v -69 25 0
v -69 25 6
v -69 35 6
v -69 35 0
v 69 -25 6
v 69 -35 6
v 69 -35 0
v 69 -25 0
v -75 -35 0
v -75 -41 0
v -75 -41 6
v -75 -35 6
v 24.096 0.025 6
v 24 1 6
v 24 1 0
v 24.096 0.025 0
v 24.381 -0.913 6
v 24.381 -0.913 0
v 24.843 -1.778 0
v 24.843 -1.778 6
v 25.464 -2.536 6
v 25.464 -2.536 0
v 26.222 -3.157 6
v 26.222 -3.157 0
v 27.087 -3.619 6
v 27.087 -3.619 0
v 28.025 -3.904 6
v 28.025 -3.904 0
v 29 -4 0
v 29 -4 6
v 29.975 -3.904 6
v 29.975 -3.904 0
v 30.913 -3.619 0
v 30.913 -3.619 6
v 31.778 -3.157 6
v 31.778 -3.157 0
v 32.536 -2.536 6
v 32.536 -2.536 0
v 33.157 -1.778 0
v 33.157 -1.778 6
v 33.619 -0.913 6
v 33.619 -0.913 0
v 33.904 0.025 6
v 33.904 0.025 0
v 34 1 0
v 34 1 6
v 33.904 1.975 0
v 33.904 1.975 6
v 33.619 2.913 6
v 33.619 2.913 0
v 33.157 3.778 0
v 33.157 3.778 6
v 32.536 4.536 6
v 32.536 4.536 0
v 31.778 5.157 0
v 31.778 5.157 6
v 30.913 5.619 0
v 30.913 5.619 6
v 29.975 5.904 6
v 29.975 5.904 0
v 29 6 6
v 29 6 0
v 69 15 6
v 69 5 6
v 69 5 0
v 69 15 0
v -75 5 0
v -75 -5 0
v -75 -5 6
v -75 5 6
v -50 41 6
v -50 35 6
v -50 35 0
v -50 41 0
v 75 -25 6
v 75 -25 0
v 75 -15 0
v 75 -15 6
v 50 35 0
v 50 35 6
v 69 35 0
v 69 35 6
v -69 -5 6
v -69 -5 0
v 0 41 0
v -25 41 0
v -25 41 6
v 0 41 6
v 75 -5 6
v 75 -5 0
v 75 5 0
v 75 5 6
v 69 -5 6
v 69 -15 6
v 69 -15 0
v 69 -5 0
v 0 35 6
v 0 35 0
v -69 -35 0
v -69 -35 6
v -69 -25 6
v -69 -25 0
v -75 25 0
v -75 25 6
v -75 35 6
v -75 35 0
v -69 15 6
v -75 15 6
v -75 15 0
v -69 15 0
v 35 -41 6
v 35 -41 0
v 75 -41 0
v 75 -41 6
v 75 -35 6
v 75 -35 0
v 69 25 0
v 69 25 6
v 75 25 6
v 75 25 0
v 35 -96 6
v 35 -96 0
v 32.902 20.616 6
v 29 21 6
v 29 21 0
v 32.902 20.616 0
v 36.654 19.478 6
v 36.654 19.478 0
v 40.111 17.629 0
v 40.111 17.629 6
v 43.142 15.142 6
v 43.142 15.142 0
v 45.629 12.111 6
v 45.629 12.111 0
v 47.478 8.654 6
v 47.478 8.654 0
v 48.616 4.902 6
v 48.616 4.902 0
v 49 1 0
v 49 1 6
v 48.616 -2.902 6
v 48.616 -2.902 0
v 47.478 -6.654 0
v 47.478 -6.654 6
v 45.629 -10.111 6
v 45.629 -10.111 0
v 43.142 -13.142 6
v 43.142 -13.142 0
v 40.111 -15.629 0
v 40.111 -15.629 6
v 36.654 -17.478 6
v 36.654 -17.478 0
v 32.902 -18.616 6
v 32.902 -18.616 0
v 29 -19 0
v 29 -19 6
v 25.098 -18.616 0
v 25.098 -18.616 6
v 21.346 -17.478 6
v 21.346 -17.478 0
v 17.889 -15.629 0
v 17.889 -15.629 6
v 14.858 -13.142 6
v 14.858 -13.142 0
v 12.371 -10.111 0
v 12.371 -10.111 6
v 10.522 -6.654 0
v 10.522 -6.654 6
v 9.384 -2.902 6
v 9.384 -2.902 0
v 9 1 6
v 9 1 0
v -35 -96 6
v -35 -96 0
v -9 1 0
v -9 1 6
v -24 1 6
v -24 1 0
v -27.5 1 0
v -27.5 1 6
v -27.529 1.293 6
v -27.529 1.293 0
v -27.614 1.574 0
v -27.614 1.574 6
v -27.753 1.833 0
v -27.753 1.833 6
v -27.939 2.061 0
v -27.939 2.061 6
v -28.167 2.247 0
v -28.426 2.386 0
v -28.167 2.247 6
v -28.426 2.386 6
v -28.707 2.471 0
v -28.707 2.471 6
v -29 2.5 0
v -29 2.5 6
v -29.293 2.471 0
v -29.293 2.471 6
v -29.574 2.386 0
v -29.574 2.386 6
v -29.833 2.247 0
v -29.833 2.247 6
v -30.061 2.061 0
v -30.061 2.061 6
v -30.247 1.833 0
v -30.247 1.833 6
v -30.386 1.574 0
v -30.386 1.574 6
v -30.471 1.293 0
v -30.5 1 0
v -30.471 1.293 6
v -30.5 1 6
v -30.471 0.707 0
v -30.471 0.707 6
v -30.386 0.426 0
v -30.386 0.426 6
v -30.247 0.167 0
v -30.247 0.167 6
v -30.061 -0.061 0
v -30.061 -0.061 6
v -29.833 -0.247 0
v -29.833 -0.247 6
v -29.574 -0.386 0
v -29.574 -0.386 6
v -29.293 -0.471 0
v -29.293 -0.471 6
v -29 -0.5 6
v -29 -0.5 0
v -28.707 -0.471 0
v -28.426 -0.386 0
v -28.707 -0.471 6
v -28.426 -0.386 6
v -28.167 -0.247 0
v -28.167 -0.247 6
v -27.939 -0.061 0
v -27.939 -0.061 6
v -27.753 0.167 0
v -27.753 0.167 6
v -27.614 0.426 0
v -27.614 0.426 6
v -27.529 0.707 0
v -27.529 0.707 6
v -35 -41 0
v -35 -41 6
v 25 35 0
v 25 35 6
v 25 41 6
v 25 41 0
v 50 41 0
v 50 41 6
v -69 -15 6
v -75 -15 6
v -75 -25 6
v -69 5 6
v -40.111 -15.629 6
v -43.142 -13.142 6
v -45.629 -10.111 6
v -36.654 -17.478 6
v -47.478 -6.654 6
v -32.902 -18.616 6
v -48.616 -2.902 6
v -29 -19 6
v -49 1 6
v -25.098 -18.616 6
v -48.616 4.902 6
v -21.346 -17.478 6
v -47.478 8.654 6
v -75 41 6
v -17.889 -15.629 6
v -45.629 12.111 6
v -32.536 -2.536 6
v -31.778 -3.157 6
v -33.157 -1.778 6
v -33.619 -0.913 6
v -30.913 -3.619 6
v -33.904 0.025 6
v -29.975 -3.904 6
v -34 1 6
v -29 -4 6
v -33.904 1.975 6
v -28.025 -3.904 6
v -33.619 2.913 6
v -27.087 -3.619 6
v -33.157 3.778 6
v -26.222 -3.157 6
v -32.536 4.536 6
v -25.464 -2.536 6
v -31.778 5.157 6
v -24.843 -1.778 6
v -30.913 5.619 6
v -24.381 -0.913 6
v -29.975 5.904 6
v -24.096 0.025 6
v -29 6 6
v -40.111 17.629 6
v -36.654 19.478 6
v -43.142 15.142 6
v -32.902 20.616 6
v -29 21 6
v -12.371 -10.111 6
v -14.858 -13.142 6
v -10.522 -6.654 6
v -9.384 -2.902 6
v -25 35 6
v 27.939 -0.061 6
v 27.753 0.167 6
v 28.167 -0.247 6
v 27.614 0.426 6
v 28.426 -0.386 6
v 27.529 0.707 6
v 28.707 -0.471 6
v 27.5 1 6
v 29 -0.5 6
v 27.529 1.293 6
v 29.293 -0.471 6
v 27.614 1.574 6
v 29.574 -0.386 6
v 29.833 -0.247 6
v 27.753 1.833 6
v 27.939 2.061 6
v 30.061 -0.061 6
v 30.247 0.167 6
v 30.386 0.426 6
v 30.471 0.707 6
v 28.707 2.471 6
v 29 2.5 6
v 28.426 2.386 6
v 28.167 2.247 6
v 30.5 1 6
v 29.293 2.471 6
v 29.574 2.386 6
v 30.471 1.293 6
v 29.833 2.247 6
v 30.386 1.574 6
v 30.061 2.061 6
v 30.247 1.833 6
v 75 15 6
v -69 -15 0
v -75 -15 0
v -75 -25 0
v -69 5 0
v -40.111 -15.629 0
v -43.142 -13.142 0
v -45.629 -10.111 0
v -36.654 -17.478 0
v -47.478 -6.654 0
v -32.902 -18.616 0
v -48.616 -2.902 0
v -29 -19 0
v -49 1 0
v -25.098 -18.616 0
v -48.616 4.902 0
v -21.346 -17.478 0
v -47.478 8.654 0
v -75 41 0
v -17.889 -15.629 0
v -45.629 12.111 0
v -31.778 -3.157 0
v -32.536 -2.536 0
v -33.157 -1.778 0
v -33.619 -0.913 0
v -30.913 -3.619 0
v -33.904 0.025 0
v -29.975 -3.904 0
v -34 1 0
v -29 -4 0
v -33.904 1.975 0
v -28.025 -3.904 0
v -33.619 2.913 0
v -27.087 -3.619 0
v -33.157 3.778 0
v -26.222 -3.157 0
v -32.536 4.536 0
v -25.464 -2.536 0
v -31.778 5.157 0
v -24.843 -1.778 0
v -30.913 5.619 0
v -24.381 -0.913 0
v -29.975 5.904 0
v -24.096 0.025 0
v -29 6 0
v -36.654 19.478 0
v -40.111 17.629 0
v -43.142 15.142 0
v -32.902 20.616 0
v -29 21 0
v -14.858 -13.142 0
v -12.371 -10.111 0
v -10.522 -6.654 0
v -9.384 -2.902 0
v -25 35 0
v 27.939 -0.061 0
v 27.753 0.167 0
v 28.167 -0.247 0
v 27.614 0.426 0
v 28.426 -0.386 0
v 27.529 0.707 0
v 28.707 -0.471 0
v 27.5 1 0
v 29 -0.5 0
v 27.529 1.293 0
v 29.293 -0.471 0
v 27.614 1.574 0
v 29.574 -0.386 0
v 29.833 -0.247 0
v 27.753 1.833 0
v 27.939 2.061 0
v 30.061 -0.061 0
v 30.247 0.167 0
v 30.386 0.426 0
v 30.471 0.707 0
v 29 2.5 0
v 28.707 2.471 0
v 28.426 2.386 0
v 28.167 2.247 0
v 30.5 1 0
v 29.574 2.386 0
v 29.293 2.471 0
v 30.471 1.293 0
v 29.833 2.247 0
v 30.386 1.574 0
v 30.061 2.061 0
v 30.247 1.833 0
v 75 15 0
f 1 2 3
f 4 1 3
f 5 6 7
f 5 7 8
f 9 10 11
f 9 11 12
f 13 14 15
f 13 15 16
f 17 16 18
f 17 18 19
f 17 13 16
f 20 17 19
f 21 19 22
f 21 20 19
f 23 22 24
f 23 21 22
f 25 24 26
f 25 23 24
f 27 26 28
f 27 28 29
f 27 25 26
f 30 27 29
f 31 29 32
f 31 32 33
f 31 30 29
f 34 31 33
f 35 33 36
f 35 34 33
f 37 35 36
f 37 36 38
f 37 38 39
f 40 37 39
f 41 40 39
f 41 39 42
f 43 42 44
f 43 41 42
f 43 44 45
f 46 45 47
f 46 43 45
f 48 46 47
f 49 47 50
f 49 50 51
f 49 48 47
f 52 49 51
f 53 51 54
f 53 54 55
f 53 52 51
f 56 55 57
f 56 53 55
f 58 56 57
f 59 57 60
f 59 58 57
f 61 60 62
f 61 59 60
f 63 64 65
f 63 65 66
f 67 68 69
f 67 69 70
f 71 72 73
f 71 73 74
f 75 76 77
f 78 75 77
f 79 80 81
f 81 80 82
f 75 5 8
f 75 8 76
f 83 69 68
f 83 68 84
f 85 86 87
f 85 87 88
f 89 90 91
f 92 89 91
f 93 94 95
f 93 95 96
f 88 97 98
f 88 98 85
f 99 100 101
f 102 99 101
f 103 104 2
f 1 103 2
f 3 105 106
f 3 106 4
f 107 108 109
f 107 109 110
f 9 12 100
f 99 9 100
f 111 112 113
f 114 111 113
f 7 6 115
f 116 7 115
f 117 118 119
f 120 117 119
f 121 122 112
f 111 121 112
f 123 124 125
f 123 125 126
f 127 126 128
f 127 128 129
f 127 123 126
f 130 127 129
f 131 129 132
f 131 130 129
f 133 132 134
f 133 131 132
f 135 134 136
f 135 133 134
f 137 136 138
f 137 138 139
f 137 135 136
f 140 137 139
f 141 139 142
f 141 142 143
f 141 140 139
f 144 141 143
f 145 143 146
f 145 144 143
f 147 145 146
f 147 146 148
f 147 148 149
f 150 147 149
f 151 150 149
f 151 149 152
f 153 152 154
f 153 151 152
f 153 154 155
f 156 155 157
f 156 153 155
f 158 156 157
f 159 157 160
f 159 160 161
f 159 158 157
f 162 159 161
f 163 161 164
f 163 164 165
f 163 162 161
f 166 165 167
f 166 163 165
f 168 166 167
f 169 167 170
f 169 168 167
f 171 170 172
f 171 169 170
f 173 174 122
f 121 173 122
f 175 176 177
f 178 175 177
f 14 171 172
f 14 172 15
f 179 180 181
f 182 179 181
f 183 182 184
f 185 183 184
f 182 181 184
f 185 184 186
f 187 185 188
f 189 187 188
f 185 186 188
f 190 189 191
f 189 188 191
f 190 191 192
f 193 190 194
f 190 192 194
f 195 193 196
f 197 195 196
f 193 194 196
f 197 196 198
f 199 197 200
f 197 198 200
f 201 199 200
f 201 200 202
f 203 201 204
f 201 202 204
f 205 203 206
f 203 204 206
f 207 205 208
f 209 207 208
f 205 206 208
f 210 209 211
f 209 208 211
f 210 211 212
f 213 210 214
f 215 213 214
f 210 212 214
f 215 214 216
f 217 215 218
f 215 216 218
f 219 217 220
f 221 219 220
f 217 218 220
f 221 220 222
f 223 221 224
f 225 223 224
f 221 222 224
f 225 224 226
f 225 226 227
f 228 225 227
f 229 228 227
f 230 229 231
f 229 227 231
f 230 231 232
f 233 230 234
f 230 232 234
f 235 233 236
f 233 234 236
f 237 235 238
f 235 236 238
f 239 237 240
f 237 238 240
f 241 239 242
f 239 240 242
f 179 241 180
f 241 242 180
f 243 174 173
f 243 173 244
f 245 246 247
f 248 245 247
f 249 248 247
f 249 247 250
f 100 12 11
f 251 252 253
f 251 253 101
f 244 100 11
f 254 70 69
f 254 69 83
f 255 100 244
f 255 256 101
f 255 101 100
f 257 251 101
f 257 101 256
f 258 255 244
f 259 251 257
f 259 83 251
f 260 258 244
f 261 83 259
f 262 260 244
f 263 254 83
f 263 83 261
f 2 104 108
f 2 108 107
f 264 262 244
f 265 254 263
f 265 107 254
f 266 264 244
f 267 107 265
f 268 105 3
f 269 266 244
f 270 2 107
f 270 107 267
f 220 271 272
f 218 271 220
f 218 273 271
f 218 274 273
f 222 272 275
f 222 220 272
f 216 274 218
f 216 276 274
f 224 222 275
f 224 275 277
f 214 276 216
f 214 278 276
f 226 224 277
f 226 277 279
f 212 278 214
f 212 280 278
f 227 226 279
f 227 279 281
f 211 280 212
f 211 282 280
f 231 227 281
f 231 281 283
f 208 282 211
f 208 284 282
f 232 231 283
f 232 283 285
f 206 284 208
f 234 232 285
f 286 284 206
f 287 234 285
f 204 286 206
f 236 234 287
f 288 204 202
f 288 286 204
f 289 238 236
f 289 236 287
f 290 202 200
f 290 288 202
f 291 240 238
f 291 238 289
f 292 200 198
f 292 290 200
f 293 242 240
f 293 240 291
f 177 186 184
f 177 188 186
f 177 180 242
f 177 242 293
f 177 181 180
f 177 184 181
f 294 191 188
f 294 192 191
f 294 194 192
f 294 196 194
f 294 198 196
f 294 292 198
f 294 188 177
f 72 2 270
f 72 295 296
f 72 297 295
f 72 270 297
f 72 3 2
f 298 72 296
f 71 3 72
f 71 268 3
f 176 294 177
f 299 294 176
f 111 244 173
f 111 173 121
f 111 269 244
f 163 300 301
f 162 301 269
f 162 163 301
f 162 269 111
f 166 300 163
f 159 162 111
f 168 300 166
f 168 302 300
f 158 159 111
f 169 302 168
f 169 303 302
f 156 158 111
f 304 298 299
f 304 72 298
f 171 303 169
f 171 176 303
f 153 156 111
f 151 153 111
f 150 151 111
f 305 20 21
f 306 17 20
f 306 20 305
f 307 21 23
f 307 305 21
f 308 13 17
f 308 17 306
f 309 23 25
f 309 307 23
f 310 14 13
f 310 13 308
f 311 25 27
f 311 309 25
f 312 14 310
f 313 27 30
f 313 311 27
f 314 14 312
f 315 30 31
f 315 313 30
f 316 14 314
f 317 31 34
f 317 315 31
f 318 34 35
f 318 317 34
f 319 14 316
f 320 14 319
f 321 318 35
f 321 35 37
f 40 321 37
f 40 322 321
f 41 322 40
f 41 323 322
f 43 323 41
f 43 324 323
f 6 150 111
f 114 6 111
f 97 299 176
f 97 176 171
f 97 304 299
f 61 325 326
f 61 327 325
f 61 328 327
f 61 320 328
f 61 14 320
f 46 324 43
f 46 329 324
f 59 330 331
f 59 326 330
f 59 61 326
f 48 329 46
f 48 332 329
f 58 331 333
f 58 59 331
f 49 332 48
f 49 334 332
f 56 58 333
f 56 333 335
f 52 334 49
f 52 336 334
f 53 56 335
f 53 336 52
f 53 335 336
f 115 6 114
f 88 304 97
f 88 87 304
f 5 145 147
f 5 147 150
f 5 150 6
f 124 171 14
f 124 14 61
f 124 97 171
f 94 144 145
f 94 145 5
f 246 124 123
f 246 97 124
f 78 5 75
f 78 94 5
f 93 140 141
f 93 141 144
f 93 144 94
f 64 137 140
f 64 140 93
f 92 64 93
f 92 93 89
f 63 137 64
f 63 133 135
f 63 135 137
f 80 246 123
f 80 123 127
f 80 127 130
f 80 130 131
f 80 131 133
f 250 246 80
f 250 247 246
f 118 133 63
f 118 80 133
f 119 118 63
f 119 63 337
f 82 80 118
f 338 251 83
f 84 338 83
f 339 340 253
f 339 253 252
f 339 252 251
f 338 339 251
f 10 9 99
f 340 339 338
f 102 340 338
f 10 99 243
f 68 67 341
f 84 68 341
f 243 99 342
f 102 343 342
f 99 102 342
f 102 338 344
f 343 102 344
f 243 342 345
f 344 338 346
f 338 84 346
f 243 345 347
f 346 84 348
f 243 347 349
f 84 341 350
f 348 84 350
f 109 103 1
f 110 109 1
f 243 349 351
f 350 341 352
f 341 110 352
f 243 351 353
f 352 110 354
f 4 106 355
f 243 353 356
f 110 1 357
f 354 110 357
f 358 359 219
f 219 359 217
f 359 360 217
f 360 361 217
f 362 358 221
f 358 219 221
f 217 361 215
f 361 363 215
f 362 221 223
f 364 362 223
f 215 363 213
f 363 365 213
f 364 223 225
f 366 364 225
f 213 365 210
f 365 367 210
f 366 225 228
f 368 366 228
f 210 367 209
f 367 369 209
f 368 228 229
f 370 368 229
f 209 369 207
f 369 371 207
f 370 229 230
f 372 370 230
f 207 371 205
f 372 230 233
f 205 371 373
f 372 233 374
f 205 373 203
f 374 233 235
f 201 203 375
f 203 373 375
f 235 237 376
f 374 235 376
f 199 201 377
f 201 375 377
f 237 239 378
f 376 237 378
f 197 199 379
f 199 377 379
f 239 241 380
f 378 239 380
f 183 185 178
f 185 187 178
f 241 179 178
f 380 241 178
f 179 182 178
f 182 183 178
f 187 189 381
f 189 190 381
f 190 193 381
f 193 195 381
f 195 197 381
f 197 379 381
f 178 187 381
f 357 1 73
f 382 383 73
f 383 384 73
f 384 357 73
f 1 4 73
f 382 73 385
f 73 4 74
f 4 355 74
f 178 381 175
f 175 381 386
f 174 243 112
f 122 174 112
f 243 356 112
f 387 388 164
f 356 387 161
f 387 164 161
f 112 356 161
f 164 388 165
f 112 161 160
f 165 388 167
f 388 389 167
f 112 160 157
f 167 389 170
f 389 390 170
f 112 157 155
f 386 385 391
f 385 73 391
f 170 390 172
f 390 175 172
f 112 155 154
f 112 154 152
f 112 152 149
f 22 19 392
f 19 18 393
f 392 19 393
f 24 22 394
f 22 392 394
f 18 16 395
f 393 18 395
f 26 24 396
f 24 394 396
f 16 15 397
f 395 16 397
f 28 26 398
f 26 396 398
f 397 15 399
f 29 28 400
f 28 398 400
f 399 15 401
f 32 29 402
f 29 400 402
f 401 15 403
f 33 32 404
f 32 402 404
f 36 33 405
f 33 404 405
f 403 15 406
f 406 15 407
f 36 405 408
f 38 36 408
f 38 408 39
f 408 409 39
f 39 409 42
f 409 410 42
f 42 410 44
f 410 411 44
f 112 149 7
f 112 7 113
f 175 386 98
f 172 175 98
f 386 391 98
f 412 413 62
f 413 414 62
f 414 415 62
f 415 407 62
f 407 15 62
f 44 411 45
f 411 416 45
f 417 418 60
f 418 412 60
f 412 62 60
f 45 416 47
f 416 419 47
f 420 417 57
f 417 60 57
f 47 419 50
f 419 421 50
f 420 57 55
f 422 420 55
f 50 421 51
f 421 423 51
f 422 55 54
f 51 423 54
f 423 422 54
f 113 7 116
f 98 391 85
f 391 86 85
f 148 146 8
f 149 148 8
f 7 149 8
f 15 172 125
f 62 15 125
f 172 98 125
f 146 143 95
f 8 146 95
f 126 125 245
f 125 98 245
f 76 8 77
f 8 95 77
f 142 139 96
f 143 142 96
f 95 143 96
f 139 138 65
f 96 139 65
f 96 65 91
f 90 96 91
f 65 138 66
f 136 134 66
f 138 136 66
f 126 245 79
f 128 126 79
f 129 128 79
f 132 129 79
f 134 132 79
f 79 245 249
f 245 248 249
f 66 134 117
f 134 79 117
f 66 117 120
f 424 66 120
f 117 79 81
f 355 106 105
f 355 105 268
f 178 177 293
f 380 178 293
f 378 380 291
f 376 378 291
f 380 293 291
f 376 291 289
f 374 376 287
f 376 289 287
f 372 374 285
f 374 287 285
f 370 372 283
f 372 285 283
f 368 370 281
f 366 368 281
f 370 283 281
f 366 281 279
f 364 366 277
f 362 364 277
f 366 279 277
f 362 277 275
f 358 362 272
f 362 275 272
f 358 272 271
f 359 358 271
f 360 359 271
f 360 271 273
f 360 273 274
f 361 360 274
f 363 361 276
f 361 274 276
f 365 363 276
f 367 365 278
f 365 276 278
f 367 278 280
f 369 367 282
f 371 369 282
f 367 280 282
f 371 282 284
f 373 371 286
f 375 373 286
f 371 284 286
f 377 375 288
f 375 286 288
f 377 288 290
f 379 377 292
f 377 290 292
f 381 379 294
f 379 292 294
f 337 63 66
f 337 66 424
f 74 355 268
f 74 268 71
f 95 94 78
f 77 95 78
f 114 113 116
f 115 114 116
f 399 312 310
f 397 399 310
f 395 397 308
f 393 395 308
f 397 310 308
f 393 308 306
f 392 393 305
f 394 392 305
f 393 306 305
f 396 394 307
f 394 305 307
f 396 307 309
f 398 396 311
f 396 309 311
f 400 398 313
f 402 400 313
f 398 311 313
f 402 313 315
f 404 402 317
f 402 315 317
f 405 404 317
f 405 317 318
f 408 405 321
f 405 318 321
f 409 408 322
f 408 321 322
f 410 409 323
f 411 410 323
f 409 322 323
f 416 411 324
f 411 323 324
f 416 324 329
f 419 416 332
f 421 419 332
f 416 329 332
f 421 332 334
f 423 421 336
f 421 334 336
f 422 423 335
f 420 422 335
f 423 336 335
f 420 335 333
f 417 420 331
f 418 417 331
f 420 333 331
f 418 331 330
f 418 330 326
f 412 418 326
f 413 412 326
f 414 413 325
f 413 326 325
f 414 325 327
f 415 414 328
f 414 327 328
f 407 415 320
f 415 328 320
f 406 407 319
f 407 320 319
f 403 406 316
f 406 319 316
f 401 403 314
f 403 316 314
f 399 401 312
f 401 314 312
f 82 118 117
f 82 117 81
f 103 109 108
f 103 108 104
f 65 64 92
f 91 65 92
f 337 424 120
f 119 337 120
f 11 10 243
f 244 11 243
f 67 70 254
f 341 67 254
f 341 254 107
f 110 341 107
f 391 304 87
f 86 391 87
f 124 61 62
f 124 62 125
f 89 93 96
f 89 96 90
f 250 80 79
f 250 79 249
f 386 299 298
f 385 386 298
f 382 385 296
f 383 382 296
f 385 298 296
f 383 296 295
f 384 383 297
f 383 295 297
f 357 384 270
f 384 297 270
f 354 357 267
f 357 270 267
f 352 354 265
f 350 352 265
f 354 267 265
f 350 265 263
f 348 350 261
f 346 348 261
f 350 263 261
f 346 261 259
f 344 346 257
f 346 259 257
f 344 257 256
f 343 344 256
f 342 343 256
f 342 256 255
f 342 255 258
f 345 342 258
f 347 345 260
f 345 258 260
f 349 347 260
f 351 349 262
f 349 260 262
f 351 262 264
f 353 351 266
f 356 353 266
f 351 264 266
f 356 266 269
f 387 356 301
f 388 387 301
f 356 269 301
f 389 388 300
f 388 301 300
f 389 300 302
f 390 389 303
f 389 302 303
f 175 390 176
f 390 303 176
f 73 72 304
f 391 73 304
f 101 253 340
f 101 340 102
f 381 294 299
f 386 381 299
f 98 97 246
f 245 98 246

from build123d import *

# Parameters (mm, degrees)
SKETCH1_W           = 70
SKETCH1_H           = 55
SKETCH1_W_2         = 150
SKETCH1_H_2         = 82
BOSS_EXTRUDE1_DEPTH = 6
SKETCH2_W           = 6
SKETCH2_H           = 10
CUT_EXTRUDE1_DEPTH  = 10
SKETCH3_R           = 1.5
CUT_EXTRUDE2_DEPTH  = 6
SKETCH4_W           = 25
SKETCH4_H           = 6
CUT_EXTRUDE3_DEPTH  = 6


with BuildPart() as part:
    # Sketch1 → Boss-Extrude1 (new body)
    with BuildSketch(Plane.XY):
        with Locations((0, -68.5)):
            Rectangle(SKETCH1_W, SKETCH1_H)
        Rectangle(SKETCH1_W_2, SKETCH1_H_2)
    extrude(amount=BOSS_EXTRUDE1_DEPTH)

    # Sketch2 → Cut-Extrude1 (cut)
    with BuildSketch(Plane.XY.offset(6)):
        with Locations((-72, 30)):
            Rectangle(SKETCH2_W, SKETCH2_H)
        with Locations((72, 30)):
            Rectangle(SKETCH2_W, SKETCH2_H)
        with Locations((72, 10)):
            Rectangle(SKETCH2_W, SKETCH2_H)
        with Locations((-72, 10)):
            Rectangle(SKETCH2_W, SKETCH2_H)
        with Locations((-72, -10)):
            Rectangle(SKETCH2_W, SKETCH2_H)
        with Locations((72, -10)):
            Rectangle(SKETCH2_W, SKETCH2_H)
        with Locations((-72, -30)):
            Rectangle(SKETCH2_W, SKETCH2_H)
        with Locations((72, -30)):
            Rectangle(SKETCH2_W, SKETCH2_H)
    extrude(amount=-CUT_EXTRUDE1_DEPTH, mode=Mode.SUBTRACT)

    # Sketch3 → Cut-Extrude2 (cut)
    with BuildSketch(Plane.XY.offset(6)):
        with Locations((-29, 1)):
            Circle(SKETCH3_R)
        with Locations(Location((29, 1, 0), (0, 0, 180))):
            Circle(SKETCH3_R)
        with BuildLine():
            Line((-9, 1), (-24, 1))
            ThreePointArc((-24, 1), (-32.535533906, -2.535533906), (-29, 6))
            Line((-29, 6), (-29, 21))
            ThreePointArc((-29, 21), (-43.142135624, -13.142135624), (-9, 1))
        make_face()
        with BuildLine():
            Line((9, 1), (24, 1))
            ThreePointArc((24, 1), (32.535533906, -2.535533906), (29, 6))
            Line((29, 6), (29, 21))
            ThreePointArc((29, 21), (43.142135624, -13.142135624), (9, 1))
        make_face()
    extrude(amount=-CUT_EXTRUDE2_DEPTH, mode=Mode.SUBTRACT)

    # Sketch4 → Cut-Extrude3 (cut)
    with BuildSketch(Plane.XY.offset(6)):
        with Locations((12.5, 38)):
            Rectangle(SKETCH4_W, SKETCH4_H)
        with Locations((62.5, 38)):
            Rectangle(SKETCH4_W, SKETCH4_H)
        with Locations((-37.5, 38)):
            Rectangle(SKETCH4_W, SKETCH4_H)
    extrude(amount=-CUT_EXTRUDE3_DEPTH, mode=Mode.SUBTRACT)


solid = part.part
